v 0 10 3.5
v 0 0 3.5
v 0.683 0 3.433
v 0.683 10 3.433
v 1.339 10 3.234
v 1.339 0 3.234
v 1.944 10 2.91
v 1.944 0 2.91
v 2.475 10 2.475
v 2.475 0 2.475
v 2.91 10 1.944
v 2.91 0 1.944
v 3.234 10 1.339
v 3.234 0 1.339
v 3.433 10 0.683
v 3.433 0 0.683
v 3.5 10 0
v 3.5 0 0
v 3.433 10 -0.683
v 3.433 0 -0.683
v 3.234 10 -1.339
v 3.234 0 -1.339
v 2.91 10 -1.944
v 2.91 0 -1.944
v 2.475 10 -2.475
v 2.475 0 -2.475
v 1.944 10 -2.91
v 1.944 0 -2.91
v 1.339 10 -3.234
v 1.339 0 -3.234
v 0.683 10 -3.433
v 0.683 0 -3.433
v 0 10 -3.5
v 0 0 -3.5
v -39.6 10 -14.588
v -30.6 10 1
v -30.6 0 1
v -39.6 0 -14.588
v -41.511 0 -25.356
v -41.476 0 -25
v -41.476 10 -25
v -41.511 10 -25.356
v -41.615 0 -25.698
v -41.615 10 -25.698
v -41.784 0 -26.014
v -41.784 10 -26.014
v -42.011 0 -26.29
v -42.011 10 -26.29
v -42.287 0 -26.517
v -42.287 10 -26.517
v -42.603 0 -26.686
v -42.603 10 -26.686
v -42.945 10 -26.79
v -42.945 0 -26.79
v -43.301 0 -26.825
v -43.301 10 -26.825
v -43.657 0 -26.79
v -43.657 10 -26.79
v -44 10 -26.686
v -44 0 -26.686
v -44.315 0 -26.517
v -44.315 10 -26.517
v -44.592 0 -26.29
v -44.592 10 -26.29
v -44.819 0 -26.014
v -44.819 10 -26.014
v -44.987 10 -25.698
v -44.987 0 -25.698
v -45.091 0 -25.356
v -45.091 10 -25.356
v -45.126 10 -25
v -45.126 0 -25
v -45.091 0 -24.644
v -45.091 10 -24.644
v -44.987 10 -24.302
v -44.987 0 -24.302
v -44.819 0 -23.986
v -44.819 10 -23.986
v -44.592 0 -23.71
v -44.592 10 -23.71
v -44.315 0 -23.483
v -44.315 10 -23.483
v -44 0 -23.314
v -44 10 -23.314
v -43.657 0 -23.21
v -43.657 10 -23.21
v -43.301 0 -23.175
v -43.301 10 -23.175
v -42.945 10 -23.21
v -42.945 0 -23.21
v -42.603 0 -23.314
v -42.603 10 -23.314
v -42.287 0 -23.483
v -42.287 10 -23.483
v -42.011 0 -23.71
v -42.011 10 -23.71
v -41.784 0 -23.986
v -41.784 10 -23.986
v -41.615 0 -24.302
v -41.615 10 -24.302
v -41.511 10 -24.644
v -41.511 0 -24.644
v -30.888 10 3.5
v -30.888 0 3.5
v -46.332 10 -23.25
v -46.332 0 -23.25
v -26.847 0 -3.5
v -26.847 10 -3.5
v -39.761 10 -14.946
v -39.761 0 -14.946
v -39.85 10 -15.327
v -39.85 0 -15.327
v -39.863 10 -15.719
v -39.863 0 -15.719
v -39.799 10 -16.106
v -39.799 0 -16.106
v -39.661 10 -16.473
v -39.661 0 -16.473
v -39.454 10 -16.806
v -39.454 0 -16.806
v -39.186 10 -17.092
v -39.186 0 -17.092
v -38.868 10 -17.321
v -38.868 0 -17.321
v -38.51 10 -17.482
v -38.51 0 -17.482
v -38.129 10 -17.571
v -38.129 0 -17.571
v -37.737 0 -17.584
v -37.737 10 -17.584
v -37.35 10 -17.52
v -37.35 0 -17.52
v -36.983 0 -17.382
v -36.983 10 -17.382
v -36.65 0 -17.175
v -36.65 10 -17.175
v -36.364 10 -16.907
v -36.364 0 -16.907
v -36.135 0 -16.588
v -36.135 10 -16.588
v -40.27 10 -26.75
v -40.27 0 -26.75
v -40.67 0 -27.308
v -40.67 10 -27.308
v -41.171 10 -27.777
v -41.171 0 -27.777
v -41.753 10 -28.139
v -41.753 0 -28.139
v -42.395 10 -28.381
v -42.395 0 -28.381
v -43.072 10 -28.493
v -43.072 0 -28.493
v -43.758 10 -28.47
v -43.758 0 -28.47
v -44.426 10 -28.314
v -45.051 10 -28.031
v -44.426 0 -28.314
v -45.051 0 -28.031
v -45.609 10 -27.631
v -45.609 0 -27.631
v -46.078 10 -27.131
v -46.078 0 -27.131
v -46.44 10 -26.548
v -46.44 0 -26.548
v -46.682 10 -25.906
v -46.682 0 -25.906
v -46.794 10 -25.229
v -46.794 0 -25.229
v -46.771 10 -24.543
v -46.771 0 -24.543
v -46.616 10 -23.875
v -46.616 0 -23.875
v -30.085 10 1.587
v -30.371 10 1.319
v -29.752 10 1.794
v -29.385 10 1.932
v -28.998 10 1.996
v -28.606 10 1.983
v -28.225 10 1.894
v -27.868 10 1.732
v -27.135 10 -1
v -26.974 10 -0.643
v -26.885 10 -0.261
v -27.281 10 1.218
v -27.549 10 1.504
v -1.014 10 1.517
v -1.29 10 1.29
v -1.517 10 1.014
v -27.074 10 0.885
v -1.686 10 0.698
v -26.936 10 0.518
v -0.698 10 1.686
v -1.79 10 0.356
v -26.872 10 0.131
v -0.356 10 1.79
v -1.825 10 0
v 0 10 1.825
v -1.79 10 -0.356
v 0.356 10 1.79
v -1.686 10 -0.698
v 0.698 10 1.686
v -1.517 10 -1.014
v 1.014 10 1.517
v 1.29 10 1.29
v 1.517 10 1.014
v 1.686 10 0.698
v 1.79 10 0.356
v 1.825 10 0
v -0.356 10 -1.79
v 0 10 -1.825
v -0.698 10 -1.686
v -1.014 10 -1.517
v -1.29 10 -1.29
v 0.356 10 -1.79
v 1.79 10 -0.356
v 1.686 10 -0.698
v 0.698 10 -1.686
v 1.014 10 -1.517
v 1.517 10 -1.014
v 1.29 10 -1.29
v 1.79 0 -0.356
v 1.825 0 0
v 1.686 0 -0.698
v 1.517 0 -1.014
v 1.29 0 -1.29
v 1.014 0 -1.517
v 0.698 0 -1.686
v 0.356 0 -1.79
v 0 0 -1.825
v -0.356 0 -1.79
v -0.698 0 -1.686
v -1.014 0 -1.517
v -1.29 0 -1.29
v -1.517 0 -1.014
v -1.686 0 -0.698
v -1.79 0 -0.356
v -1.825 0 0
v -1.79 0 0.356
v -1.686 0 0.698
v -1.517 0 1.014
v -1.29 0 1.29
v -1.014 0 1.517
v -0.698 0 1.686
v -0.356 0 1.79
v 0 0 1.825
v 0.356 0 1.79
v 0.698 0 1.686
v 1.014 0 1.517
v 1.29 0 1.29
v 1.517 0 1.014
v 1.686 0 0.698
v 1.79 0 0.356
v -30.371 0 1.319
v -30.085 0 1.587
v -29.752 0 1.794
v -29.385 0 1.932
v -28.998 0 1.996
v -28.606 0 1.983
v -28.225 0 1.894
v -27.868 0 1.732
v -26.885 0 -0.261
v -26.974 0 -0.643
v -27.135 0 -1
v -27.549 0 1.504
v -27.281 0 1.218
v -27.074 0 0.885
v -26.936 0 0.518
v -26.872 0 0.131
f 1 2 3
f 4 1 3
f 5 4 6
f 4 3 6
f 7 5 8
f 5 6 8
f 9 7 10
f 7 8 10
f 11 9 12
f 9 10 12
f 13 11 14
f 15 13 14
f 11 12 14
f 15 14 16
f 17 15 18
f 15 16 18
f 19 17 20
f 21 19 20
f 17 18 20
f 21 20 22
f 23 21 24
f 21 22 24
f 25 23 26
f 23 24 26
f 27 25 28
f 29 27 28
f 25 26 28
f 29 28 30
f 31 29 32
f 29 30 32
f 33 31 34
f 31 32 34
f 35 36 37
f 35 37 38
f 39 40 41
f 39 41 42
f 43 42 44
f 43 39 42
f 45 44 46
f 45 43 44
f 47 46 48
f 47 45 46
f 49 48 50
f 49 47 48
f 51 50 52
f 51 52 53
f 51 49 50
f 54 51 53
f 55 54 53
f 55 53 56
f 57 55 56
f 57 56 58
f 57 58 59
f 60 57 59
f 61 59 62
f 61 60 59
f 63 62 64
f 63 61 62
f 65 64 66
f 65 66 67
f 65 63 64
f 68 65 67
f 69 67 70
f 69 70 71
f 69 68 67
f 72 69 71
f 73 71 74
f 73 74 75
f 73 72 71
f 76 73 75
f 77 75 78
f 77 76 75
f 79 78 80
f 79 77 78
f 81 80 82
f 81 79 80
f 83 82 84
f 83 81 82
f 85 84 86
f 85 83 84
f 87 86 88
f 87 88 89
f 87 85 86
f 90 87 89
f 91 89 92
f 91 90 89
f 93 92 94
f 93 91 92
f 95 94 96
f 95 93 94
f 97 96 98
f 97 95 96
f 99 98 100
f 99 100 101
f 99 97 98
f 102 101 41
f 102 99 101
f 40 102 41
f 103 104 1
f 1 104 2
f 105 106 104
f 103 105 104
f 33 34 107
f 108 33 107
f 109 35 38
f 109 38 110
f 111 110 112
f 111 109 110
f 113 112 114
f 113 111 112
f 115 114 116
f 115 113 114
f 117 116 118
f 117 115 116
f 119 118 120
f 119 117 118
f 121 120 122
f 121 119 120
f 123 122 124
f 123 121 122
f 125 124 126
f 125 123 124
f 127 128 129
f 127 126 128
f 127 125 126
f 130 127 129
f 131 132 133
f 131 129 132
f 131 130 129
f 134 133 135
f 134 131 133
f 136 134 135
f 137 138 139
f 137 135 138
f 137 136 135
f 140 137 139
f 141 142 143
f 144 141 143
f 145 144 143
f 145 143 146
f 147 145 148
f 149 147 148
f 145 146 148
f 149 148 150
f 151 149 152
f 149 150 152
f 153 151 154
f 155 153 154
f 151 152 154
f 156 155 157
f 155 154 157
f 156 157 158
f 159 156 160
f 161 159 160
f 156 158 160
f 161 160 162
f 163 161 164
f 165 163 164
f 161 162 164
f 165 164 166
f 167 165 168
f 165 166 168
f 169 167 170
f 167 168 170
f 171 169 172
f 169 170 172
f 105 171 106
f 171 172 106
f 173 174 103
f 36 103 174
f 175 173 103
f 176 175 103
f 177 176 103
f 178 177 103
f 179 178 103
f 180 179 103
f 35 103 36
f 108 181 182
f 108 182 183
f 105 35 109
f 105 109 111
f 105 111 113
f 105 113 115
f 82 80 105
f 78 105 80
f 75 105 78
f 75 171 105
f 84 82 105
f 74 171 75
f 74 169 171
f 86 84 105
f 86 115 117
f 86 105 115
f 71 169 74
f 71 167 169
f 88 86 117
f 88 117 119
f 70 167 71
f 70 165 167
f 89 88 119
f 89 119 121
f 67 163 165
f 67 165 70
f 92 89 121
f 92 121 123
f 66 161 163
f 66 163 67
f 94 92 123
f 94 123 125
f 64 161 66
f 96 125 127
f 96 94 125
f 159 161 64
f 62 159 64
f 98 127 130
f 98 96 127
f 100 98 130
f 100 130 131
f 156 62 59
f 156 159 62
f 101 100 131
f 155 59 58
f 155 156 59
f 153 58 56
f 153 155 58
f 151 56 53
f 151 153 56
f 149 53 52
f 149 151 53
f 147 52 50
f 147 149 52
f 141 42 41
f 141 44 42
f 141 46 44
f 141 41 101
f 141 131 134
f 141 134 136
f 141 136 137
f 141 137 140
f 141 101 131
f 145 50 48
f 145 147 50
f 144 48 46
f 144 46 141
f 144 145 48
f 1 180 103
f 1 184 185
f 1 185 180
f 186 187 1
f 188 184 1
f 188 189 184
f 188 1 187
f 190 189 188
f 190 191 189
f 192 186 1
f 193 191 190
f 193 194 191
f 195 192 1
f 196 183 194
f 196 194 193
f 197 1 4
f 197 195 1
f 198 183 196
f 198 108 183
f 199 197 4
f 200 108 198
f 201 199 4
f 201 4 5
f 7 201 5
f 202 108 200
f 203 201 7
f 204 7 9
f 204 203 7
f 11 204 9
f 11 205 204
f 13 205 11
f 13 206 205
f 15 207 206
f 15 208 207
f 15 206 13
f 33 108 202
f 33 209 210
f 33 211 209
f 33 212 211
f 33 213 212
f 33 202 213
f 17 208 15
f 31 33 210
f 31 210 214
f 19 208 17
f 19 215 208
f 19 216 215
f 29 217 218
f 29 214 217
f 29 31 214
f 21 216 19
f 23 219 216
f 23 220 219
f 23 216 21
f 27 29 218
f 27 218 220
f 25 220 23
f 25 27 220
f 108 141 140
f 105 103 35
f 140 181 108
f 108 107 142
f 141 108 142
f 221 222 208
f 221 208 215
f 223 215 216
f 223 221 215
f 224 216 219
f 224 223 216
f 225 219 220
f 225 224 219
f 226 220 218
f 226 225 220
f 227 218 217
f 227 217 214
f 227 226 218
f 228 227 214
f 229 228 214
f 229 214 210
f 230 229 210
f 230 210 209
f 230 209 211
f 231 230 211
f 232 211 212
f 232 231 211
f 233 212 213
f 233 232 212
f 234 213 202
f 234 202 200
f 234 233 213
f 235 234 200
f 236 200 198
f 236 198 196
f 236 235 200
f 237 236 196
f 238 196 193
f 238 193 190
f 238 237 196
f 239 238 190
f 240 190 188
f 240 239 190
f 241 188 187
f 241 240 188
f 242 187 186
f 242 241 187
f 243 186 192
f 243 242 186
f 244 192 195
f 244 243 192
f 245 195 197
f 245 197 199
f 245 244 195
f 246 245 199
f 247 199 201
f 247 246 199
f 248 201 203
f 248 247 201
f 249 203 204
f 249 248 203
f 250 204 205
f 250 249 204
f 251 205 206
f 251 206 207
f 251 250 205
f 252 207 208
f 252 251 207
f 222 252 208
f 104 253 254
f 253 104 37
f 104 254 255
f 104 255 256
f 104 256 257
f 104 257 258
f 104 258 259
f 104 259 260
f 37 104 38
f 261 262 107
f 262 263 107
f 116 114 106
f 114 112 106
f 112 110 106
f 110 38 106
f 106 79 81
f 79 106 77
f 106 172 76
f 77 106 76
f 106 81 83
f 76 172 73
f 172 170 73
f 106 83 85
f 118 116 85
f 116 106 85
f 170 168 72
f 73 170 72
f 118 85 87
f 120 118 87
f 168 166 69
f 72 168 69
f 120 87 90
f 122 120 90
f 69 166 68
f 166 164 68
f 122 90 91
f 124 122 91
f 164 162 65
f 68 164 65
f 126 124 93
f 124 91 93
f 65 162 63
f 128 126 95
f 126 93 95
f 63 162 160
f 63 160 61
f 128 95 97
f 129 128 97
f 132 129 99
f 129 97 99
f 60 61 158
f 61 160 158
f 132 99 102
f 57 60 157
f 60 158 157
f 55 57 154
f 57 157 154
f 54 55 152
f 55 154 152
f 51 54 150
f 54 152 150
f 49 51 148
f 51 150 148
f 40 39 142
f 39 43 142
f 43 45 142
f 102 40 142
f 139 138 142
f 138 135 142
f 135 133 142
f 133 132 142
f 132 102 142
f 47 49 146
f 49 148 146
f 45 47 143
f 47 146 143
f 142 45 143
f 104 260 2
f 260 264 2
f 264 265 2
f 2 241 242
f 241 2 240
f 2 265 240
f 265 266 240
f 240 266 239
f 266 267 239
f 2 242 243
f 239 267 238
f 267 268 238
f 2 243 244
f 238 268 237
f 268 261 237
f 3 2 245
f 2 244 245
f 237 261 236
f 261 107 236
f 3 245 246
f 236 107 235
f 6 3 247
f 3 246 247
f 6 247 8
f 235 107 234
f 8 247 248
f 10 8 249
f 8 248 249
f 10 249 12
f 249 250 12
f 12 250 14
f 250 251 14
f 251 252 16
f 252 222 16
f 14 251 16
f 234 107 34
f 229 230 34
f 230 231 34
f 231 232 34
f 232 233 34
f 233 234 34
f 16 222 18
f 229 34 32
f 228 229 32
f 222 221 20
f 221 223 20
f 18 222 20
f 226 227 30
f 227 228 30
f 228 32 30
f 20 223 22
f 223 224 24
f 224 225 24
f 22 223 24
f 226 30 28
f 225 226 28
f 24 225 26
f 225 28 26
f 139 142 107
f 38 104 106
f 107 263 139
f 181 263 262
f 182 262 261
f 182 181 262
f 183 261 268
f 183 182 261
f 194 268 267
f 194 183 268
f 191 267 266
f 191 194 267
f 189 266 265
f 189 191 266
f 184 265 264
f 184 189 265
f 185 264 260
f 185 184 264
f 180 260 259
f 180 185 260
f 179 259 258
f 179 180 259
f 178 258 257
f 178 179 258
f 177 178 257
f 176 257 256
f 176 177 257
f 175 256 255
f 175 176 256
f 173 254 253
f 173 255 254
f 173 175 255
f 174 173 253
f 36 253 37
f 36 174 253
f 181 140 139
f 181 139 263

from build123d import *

# Parameters (mm, degrees)
SKIZZE2_R                       = 1.825
AUFSATZ_LINEAR_AUSTRAGEN1_DEPTH = 10
SCHNITT_LINEAR_AUSTRAGEN1_DEPTH = 11


with BuildPart() as part:
    # Skizze2 → Aufsatz-Linear austragen1 (new body)
    with BuildSketch(Plane(origin=(0, 0, 0), x_dir=(1, 0, 0), z_dir=(0, 1, 0))):
        with BuildLine():
            Line((0, 3.5), (-26.846787517, 3.5))
            Line((-26.846787517, 3.5), (-40.270181276, 26.75))
            ThreePointArc((-40.270181276, 26.75), (-45.051270189, 28.031088913), (-46.332359102, 23.25))
            Line((-46.332359102, 23.25), (-30.888239402, -3.5))
            Line((-30.888239402, -3.5), (0, -3.5))
            ThreePointArc((0, -3.5), (3.5, 0), (0, 3.5))
        make_face()
        with Locations((-43.301270189, 25)):
            Circle(SKIZZE2_R, mode=Mode.SUBTRACT)
        Circle(SKIZZE2_R, mode=Mode.SUBTRACT)
    extrude(amount=AUFSATZ_LINEAR_AUSTRAGEN1_DEPTH)

    # Skizze4 → Schnitt-Linear austragen1 (cut, through all)
    with BuildSketch(Plane(origin=(0, 10, 0), x_dir=(1, 0, 0), z_dir=(0, 1, 0))):
        with BuildLine():
            Line((-36.135462652, 16.588457268), (-27.135462652, 1))
            ThreePointArc((-27.135462652, 1), (-27.867513459, -1.732050808), (-30.599564267, -1))
            Line((-30.599564267, -1), (-39.599564267, 14.588457268))
            ThreePointArc((-39.599564267, 14.588457268), (-38.867513459, 17.320508076), (-36.135462652, 16.588457268))
        make_face()
    extrude(amount=-SCHNITT_LINEAR_AUSTRAGEN1_DEPTH, mode=Mode.SUBTRACT)


solid = part.part
